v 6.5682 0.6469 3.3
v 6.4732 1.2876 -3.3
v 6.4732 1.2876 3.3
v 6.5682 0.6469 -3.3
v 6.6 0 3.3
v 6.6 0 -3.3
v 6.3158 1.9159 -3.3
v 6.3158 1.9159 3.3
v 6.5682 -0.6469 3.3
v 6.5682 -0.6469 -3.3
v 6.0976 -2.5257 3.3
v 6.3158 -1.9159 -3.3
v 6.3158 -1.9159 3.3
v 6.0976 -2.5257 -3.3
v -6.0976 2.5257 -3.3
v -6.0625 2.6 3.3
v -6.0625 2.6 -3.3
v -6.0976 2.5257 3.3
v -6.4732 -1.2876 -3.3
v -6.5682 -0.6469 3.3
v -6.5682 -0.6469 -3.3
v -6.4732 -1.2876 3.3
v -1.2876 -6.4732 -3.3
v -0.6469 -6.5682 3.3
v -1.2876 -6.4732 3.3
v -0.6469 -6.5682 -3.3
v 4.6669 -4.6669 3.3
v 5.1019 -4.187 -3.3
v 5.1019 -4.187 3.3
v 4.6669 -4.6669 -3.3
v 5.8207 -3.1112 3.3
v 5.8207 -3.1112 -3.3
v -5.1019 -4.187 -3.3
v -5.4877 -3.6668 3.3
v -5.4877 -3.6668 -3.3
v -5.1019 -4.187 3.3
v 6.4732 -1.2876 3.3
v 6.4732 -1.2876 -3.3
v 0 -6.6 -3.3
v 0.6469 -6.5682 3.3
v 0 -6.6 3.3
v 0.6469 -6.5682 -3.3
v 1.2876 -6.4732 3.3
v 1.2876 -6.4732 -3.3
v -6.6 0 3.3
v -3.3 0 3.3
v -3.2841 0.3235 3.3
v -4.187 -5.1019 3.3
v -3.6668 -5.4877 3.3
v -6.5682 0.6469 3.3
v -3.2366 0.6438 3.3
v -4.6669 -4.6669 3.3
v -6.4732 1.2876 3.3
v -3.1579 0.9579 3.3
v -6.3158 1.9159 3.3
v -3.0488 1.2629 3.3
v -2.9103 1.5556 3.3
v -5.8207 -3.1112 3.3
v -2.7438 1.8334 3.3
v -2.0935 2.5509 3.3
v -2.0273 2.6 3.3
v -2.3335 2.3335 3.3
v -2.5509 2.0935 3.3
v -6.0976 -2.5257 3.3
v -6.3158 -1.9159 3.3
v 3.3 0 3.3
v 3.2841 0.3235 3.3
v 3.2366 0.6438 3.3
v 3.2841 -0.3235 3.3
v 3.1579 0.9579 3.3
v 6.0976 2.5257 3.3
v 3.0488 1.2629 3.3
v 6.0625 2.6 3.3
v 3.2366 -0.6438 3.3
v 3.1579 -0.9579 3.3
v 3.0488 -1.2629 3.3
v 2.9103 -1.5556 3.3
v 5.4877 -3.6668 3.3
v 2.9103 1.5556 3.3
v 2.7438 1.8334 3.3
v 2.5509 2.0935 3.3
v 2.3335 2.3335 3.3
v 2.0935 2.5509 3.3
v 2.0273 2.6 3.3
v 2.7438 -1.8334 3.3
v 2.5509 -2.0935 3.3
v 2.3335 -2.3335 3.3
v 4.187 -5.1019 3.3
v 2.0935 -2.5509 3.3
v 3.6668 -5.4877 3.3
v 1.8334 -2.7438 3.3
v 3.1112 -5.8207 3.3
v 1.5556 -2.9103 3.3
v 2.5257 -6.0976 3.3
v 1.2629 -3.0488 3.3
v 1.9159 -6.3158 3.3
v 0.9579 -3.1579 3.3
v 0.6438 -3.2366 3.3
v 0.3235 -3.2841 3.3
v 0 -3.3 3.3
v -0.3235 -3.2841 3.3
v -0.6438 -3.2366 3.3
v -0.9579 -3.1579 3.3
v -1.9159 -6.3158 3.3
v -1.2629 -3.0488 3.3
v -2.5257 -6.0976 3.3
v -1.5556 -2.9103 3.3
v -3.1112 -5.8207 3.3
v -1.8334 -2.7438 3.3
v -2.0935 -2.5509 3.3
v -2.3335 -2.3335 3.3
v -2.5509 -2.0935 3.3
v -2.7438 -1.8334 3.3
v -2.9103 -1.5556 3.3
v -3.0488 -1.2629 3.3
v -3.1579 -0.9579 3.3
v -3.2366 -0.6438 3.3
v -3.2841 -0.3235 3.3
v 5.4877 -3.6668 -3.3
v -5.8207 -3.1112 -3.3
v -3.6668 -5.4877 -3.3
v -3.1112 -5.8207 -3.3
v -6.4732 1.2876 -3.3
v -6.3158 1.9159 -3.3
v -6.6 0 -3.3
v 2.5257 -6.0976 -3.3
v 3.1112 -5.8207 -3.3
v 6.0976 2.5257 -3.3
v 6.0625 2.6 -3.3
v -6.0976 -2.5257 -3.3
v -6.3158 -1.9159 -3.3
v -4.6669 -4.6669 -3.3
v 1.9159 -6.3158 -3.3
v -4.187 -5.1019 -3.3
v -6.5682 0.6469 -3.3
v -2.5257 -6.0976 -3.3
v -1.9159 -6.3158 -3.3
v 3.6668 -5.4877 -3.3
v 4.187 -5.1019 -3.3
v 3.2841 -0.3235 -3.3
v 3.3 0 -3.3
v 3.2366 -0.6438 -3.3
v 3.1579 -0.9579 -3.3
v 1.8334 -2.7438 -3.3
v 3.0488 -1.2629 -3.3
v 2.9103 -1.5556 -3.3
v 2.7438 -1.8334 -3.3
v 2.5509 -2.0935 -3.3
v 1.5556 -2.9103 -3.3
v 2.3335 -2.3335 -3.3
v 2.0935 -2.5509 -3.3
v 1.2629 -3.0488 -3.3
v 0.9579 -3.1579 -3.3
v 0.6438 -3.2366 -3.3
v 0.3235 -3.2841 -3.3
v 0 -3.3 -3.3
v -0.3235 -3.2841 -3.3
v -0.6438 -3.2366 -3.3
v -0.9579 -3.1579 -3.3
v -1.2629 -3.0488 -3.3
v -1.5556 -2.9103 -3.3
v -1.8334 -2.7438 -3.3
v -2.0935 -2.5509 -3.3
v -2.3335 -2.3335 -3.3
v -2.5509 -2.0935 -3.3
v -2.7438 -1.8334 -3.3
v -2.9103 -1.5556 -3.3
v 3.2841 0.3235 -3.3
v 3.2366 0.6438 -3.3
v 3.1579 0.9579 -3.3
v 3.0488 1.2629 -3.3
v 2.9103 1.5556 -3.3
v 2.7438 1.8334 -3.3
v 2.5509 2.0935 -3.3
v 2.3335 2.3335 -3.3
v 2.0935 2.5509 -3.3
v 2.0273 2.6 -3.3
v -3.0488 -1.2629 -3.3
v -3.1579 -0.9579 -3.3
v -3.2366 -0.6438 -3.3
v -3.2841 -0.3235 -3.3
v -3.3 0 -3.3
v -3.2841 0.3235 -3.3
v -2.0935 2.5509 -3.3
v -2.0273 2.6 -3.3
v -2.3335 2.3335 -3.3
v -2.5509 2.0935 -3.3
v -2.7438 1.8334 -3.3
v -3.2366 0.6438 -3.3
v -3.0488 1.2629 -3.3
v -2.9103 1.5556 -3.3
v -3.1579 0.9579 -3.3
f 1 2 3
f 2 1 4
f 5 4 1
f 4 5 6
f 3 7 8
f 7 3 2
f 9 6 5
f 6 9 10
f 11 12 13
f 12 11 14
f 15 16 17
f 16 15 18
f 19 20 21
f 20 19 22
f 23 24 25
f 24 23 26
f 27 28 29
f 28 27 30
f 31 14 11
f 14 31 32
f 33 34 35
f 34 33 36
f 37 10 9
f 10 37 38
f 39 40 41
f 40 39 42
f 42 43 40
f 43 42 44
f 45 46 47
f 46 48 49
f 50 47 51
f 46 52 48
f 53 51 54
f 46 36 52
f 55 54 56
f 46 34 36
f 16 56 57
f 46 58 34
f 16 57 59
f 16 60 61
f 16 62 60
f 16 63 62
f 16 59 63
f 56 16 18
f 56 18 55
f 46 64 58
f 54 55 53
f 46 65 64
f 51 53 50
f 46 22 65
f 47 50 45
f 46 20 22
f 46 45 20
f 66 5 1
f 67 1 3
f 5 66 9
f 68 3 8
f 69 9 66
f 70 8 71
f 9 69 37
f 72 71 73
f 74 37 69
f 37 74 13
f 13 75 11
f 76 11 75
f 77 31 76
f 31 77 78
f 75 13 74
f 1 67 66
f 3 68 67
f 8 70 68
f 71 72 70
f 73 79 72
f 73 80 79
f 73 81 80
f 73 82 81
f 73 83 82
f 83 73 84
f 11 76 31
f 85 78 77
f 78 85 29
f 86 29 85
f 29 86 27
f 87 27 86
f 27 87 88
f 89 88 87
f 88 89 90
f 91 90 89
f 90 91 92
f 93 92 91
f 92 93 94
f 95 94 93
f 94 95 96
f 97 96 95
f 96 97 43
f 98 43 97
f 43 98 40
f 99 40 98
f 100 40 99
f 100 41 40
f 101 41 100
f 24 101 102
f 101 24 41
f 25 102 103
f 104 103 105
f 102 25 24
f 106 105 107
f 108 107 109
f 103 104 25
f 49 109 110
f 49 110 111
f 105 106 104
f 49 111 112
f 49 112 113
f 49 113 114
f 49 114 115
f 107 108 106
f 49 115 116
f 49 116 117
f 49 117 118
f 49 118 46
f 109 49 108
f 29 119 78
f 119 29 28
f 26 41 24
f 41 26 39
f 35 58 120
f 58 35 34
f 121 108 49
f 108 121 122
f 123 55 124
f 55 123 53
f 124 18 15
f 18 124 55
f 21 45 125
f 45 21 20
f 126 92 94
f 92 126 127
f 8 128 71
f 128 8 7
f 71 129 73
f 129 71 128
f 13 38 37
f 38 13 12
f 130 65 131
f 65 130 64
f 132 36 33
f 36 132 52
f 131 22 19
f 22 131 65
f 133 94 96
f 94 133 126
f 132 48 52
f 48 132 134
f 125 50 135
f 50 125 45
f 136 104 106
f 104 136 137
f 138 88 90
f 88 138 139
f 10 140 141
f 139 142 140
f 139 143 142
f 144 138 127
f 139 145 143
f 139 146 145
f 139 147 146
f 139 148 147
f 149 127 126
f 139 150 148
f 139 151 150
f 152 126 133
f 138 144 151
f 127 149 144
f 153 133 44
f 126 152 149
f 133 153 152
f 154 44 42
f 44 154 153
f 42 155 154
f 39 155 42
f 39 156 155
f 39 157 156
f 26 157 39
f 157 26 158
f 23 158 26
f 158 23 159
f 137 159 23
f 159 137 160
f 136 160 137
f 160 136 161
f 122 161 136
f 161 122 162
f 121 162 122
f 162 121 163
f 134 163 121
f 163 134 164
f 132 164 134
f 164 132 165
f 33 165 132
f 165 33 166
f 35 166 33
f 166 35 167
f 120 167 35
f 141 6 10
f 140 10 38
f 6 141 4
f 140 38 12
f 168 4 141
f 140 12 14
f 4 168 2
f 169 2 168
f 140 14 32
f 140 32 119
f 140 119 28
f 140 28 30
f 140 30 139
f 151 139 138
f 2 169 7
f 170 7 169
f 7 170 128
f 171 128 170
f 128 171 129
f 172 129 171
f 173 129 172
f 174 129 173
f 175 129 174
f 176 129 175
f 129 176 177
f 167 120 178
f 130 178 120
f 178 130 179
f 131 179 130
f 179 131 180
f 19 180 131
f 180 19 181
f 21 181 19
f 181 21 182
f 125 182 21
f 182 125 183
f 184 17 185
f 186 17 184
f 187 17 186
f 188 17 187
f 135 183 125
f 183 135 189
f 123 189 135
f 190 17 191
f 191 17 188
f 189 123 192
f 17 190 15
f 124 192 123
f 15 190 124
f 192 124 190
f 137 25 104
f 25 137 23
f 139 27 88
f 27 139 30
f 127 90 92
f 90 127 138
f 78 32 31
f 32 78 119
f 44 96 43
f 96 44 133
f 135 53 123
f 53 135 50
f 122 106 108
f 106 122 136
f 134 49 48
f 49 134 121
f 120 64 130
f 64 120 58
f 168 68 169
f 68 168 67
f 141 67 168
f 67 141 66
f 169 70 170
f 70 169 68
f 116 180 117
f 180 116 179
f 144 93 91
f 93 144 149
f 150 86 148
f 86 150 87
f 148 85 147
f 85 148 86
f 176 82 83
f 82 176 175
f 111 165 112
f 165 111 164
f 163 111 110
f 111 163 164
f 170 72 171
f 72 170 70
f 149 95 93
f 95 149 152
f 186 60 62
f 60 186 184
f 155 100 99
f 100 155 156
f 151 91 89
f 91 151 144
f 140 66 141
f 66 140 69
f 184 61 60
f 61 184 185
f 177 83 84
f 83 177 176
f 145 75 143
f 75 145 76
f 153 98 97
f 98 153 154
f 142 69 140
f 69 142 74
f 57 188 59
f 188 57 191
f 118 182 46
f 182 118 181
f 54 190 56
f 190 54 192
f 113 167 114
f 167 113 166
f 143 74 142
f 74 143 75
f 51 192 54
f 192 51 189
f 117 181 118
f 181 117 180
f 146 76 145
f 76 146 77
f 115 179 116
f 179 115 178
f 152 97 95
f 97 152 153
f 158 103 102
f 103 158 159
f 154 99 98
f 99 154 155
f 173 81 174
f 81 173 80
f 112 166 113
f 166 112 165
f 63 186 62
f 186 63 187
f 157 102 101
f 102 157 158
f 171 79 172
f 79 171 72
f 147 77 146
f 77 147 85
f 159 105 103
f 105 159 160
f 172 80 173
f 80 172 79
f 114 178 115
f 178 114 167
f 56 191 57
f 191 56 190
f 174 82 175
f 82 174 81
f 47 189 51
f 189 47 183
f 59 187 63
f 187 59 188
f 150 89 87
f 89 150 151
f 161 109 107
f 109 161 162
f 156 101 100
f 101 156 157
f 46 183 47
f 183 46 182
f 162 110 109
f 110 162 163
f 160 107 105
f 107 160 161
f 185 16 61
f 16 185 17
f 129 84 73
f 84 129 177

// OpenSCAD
// COBRA Vertebra - T5 V11
// Height: 6.6000000000000005mm, OD: 13.200000000000001mm

$fn = 64;

difference() {
    // Outer cylinder
    cylinder(h=6.6000000000000005, d=13.200000000000001, center=true);
    
    // Inner channel
    cylinder(h=8.600000000000001, d=6.6000000000000005, center=true);

    // Solar panel cavity
    translate([0, 4.6000000000000005, 0])
    cube([50, 4, 30], center=true);

    // Pivot holes
    translate([0, 6.6000000000000005, 0.30000000000000027])
    rotate([90, 0, 0])
    cylinder(h=5.300000000000001, d=4, center=true);
    
    translate([0, 6.6000000000000005, -0.30000000000000027])
    rotate([90, 0, 0])
    cylinder(h=5.300000000000001, d=4, center=true);
}
